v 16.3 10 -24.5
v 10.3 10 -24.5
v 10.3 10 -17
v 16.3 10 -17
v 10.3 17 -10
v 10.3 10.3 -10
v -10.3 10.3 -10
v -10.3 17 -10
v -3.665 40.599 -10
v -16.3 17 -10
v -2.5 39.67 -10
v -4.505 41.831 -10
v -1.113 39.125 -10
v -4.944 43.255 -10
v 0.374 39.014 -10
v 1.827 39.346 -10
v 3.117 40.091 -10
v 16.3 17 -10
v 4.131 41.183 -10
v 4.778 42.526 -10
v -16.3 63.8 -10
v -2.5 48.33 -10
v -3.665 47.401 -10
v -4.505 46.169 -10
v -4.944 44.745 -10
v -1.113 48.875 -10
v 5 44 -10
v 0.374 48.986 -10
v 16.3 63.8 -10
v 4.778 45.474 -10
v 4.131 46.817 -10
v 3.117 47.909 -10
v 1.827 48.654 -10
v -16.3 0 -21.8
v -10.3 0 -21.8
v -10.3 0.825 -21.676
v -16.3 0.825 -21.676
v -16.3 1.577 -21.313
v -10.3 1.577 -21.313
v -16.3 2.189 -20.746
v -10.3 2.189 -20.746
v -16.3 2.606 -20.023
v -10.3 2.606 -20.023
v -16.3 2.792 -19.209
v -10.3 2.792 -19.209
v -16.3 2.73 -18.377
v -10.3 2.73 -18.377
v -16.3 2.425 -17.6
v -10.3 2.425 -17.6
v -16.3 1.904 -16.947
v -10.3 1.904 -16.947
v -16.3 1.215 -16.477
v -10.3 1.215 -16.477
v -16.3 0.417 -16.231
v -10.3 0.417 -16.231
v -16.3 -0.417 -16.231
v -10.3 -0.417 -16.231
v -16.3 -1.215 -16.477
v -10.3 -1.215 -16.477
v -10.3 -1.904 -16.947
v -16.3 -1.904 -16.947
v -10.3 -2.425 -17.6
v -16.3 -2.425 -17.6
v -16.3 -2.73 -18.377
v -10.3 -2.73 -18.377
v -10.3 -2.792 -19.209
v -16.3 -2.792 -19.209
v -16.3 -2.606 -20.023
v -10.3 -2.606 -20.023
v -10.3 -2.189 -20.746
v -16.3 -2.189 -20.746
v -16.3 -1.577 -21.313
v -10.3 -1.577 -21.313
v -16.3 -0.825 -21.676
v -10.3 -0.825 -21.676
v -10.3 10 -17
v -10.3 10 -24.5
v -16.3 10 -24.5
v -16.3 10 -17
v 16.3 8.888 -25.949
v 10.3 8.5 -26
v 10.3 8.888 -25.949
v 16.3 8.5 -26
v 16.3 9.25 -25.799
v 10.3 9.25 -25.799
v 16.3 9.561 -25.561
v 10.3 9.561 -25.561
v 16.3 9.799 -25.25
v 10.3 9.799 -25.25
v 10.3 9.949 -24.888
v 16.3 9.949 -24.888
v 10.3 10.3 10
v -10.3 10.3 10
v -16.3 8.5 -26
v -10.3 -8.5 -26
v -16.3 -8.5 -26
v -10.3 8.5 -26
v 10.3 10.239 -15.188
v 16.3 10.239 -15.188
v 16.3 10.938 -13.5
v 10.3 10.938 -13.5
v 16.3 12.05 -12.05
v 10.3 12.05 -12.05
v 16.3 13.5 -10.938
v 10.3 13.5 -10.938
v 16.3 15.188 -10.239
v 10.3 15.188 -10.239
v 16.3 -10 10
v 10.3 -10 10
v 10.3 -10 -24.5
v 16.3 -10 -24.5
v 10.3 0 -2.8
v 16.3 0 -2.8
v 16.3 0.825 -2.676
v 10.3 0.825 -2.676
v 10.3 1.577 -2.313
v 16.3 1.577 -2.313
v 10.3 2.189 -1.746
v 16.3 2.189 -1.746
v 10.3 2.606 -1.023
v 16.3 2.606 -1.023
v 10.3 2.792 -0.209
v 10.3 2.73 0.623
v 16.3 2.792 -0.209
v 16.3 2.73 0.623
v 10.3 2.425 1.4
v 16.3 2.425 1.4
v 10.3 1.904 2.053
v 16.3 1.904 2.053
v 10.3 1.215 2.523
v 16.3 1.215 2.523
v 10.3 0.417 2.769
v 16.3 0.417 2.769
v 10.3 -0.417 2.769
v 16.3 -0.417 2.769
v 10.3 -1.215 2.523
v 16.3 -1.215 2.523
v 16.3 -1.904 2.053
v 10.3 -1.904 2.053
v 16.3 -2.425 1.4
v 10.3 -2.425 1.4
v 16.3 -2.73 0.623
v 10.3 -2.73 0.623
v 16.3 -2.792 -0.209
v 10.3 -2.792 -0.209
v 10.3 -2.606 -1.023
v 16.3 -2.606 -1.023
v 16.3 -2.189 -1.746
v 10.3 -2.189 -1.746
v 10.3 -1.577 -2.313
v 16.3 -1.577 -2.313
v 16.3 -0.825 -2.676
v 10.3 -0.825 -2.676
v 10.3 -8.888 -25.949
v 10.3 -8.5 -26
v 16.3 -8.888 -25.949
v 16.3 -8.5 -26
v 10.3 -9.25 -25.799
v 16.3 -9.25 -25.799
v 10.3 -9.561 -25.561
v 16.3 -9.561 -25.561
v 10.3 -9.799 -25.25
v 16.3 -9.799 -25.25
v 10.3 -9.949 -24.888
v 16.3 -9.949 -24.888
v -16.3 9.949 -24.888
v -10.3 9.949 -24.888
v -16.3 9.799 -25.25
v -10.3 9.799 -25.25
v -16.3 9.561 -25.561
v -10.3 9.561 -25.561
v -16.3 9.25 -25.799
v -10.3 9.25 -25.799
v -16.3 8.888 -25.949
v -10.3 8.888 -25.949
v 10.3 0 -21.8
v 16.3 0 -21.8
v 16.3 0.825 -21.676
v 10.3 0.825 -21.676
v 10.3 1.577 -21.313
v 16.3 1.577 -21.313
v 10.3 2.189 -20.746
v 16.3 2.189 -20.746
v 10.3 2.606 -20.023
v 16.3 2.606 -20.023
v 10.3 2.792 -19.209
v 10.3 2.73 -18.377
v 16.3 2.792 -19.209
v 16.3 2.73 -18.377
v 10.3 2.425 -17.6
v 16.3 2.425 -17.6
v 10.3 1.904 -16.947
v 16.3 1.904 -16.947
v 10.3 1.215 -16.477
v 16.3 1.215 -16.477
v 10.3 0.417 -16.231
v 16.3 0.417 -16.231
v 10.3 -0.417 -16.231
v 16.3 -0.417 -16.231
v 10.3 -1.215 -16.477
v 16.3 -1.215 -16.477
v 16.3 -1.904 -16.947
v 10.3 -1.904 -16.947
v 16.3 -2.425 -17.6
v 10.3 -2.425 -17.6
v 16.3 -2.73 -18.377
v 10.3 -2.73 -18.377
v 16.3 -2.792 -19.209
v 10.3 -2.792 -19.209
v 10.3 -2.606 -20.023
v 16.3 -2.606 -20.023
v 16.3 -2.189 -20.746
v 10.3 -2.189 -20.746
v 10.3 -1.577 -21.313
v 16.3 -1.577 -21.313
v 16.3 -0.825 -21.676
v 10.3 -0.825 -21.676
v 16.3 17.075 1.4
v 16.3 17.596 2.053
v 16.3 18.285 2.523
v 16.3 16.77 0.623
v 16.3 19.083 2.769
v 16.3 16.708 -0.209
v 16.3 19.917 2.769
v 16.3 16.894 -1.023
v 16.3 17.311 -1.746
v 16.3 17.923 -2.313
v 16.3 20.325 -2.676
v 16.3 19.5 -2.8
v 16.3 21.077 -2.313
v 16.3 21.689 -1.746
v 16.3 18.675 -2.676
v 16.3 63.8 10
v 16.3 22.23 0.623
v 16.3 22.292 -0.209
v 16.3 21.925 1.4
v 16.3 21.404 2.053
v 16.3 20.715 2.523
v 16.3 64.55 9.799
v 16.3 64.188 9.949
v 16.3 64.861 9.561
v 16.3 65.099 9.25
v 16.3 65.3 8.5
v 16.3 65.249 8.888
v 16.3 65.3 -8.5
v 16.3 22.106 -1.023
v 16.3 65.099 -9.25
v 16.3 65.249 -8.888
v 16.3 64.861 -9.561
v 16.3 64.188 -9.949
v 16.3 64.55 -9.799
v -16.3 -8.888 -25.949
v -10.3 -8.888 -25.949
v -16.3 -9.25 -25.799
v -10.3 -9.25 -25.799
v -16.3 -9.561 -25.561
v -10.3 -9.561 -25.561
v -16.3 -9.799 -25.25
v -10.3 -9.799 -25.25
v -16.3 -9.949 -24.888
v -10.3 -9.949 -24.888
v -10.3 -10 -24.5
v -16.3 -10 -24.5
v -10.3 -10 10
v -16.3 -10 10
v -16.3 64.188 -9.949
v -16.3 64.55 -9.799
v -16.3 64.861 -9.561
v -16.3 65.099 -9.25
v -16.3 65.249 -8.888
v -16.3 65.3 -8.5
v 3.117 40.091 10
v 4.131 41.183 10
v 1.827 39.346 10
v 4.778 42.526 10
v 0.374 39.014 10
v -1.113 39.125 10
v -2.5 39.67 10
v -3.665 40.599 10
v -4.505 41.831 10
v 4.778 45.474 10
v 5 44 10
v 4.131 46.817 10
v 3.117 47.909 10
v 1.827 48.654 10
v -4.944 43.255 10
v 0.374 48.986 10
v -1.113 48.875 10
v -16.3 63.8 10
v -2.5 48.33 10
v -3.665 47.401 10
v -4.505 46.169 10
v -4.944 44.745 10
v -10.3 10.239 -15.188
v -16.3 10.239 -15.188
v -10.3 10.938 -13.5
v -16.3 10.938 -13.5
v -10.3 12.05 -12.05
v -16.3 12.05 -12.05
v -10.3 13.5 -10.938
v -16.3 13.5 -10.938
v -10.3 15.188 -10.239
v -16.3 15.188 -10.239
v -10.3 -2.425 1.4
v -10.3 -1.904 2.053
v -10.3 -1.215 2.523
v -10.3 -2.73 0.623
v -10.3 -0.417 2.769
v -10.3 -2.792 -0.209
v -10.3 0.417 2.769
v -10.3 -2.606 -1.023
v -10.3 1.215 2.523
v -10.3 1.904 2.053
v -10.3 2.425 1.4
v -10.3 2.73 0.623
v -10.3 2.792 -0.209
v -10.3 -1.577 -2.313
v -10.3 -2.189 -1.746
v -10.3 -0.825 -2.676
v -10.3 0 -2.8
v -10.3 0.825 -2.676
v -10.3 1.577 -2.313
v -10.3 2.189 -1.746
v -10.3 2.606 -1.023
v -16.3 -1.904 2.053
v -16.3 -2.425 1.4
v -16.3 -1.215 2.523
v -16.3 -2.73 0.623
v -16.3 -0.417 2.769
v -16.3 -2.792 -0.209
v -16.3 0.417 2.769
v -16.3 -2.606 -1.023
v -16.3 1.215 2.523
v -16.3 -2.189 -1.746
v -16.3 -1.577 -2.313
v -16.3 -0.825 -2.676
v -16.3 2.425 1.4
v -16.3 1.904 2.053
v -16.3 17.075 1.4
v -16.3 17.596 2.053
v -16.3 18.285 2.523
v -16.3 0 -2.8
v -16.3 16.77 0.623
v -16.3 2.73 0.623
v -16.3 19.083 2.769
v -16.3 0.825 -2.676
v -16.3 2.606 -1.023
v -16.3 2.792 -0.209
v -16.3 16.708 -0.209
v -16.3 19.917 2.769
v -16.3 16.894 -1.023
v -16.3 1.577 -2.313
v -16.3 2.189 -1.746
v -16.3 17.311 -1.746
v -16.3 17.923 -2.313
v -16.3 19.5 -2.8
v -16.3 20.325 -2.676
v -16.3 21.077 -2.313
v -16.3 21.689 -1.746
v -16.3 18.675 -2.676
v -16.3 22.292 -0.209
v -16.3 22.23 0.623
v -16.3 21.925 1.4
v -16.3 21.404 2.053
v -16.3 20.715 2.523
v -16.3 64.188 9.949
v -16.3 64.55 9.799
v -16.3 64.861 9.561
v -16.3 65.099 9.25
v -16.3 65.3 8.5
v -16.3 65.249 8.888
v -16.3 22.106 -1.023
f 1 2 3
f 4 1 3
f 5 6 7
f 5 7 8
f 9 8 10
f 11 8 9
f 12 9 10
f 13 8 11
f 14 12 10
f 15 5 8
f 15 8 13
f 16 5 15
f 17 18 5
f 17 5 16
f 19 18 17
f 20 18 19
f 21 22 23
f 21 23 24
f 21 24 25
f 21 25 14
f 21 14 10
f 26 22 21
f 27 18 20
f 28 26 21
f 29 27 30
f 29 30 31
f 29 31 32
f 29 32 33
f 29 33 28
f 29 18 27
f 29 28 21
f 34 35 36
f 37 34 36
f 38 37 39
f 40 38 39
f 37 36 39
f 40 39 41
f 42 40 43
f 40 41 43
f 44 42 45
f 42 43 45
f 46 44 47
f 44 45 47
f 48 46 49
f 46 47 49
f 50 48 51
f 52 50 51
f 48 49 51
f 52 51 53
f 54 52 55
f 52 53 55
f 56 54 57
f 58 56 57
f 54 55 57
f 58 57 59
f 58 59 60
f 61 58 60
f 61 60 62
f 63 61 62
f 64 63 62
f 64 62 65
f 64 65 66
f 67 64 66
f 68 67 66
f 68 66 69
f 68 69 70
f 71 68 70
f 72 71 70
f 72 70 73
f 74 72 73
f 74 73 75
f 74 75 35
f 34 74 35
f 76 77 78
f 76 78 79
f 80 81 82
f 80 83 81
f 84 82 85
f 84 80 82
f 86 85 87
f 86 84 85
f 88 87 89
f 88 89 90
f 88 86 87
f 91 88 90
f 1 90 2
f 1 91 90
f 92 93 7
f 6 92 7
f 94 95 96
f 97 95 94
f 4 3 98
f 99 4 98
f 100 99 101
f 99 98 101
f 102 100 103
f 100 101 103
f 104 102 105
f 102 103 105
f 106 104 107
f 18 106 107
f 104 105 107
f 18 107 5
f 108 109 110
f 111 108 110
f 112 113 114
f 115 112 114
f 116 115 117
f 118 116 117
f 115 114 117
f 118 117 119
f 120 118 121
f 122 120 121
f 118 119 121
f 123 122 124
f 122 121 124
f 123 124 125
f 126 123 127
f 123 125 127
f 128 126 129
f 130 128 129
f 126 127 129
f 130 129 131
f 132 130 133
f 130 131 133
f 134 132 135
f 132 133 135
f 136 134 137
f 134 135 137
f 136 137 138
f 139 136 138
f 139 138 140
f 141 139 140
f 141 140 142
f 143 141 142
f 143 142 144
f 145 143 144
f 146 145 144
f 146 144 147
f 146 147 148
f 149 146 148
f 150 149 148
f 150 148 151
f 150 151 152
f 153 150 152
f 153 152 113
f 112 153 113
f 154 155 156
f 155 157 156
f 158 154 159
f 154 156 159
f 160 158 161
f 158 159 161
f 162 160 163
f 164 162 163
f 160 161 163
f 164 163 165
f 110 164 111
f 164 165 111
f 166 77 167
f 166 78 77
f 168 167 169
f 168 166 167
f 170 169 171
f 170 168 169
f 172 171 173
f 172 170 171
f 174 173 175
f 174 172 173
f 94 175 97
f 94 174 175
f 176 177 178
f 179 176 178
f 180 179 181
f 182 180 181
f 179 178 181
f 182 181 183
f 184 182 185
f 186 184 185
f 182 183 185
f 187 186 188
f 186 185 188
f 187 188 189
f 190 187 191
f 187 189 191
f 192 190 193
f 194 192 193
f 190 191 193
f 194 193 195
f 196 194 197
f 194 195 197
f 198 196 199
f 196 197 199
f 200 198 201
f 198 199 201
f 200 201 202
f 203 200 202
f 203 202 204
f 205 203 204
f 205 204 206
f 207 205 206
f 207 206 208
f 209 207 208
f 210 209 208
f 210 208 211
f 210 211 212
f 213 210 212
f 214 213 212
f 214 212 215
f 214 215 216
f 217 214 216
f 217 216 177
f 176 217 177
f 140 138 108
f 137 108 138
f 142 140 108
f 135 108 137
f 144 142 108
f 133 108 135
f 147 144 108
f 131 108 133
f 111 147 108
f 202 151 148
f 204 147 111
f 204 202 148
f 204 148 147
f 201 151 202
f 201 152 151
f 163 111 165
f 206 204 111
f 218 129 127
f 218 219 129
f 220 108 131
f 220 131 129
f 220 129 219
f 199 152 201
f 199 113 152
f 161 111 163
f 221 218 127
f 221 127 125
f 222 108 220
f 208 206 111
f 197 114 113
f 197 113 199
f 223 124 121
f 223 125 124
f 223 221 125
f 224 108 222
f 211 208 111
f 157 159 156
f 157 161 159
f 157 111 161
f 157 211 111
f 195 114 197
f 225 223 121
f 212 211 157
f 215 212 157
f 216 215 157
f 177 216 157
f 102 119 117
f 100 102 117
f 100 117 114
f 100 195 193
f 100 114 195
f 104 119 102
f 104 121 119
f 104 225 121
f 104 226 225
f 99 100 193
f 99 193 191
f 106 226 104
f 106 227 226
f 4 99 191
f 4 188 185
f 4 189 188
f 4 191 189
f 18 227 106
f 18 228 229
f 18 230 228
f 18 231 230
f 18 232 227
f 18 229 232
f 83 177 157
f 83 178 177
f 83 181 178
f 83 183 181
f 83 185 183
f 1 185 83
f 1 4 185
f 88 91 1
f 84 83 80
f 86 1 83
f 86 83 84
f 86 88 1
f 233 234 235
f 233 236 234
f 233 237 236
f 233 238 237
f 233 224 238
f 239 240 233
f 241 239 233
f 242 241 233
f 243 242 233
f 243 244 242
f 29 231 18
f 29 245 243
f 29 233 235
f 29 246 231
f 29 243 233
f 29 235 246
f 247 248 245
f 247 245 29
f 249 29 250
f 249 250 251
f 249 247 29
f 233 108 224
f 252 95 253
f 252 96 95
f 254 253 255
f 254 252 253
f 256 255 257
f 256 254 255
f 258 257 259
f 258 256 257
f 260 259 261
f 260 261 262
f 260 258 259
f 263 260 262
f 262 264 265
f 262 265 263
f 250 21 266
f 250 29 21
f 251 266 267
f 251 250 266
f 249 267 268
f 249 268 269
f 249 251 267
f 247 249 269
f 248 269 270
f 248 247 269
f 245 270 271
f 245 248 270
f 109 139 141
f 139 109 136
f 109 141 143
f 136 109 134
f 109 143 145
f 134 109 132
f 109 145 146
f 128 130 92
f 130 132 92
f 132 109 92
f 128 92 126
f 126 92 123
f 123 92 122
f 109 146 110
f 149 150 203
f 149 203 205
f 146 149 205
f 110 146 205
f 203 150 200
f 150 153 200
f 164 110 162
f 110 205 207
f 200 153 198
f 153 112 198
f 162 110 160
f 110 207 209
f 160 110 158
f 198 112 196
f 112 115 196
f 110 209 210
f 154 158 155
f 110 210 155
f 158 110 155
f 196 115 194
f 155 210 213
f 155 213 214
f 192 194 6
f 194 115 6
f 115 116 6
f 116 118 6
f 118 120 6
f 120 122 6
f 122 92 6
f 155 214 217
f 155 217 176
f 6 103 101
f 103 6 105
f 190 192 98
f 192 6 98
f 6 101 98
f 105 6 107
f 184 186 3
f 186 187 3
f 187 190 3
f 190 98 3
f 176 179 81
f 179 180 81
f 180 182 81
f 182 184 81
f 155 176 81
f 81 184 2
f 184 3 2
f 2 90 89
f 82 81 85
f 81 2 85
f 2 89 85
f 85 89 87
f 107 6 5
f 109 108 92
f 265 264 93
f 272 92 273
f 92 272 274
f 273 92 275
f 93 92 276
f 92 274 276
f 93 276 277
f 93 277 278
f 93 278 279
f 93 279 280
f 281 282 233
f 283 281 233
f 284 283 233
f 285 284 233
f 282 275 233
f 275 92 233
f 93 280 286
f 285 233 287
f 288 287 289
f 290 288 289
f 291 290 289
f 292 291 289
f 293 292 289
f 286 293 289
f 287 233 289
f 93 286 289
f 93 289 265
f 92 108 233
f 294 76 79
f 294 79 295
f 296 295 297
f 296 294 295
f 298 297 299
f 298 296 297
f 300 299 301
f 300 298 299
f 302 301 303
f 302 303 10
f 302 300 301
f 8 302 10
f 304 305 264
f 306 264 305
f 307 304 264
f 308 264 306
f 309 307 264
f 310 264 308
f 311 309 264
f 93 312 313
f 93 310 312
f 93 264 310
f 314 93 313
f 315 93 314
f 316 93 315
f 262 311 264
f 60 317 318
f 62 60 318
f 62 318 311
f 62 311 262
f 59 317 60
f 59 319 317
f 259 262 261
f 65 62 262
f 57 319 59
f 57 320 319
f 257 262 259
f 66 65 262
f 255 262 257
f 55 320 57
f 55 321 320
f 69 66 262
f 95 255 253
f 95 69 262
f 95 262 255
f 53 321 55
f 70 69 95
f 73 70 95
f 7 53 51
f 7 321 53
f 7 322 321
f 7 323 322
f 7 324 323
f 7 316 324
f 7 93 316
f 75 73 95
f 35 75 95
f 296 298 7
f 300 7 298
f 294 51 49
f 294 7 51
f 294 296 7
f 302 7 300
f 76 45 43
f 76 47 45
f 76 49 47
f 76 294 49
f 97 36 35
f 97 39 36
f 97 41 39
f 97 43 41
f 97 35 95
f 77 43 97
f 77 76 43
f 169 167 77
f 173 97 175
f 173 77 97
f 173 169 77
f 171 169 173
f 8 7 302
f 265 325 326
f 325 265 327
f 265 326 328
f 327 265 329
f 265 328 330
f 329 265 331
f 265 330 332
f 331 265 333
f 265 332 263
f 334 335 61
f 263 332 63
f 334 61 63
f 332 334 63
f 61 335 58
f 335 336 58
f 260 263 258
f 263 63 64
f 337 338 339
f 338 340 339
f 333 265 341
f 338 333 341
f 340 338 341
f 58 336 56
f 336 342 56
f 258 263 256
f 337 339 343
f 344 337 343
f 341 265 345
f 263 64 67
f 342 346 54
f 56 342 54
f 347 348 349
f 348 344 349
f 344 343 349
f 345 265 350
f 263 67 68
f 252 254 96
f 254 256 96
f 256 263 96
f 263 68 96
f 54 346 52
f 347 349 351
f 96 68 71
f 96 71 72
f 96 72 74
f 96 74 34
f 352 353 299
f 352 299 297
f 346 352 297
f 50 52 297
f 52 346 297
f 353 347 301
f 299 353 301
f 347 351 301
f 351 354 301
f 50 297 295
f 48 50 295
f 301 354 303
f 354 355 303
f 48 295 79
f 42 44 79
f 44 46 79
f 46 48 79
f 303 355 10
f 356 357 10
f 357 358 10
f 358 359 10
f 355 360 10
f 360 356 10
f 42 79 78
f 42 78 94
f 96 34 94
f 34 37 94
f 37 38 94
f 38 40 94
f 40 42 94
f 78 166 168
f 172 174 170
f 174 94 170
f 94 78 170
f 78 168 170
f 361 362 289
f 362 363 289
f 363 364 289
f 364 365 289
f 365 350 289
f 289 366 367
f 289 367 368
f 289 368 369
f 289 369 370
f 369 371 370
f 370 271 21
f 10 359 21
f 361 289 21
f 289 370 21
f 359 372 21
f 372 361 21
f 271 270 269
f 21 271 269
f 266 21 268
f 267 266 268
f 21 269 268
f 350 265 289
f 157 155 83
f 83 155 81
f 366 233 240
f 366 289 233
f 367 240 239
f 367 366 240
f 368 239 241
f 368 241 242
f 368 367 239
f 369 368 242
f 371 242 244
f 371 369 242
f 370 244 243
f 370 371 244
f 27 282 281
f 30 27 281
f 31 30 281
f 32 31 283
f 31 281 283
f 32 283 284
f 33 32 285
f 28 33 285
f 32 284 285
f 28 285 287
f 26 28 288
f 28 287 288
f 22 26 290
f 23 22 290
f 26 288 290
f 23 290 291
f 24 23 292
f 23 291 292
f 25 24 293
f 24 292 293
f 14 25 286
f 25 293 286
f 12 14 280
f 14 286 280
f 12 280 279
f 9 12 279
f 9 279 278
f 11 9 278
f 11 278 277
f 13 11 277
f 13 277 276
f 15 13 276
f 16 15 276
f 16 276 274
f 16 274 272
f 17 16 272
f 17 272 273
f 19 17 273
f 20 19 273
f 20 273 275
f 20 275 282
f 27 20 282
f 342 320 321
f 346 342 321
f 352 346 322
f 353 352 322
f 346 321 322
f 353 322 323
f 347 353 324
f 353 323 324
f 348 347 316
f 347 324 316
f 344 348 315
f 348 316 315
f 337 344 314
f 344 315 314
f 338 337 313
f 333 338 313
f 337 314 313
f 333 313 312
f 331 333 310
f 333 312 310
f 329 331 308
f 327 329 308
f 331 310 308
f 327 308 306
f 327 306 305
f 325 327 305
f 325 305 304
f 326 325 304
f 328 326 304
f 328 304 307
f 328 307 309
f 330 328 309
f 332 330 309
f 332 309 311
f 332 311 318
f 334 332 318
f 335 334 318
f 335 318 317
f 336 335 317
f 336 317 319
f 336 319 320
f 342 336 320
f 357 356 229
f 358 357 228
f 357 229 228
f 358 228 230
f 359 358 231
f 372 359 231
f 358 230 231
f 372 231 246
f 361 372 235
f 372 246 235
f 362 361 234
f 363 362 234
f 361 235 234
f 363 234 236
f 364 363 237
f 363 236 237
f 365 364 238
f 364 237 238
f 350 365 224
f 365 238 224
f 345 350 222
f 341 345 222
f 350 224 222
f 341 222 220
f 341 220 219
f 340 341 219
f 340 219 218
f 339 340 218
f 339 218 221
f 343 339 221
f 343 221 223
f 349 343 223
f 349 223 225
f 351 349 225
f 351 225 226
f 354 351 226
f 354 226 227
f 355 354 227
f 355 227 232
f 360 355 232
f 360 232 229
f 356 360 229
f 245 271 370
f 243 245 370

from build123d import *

# Parameters (mm, degrees)
EXTRUDE1_DEPTH      = 10.3
EXTRUDE1_DEPTH_BACK = 10.3
SKETCH1_W           = 20
SKETCH1_H           = 55
EXTRUDE2_DEPTH      = 6
SKETCH4_R           = 2.8
EXTRUDE3_DEPTH      = 78.478061411
SKETCH5_R           = 5
EXTRUDE4_DEPTH      = 77.326797391
FILLET2_R           = 1.5
SKETCH_1_W          = 32.6
SKETCH_1_H          = 73.8
CUT_EXTRUDE_1_DEPTH = 77.326797391


with BuildPart() as part:
    # Sketch1 → Extrude1 (new, two sides: drawn at the far end of the back side and taken through both)
    with BuildSketch(Plane(origin=(0, 0, 0), x_dir=(0, 0, -1), z_dir=(1, 0, 0)).offset(-EXTRUDE1_DEPTH_BACK)):
        with Locations((0, 37.8)):
            Rectangle(SKETCH1_W, SKETCH1_H)
    extrude(amount=EXTRUDE1_DEPTH + EXTRUDE1_DEPTH_BACK)

    # Sketch2 → Extrude2 (add)
    with BuildSketch(Plane(origin=(10.3, 0, 0), x_dir=(0, 0, -1), z_dir=(1, 0, 0))):
        with BuildLine():
            Line((26, 10), (17, 10))
            ThreePointArc((17, 10), (12.050252532, 12.050252532), (10, 17))
            Line((10, 17), (10, 65.3))
            Line((10, 65.3), (-10, 65.3))
            Line((-10, 65.3), (-10, 17))
            ThreePointArc((-10, 17), (-12.050252532, 12.050252532), (-17, 10))
            Line((-17, 10), (-26, 10))
            Line((-26, 10), (-26, -10))
            Line((-26, -10), (26, -10))
            Line((26, -10), (26, 10))
        make_face()
    extrude2 = extrude(amount=EXTRUDE2_DEPTH)

    # Mirror2: Extrude2 across plane
    add(extrude2.mirror(Plane(origin=(0, 0, 0), x_dir=(0, 0, 1), z_dir=(1, 0, 0))))

    # Sketch4 → Extrude3 (cut, through all)
    with BuildSketch(Plane(origin=(16.3, 0, 0), x_dir=(0, 0, -1), z_dir=(1, 0, 0))):
        Circle(SKETCH4_R)
        with Locations((19, 0)):
            Circle(SKETCH4_R)
        with Locations((-19, 0)):
            Circle(SKETCH4_R)
        with Locations((0, 19.5)):
            Circle(SKETCH4_R)
    extrude(amount=-EXTRUDE3_DEPTH, mode=Mode.SUBTRACT)

    # Sketch5 → Extrude4 (cut, through all)
    with BuildSketch(Plane.XY.offset(10)):
        with Locations((0, 44)):
            Circle(SKETCH5_R)
    extrude(amount=-EXTRUDE4_DEPTH, mode=Mode.SUBTRACT)

    # Fillet2
    fillet2_edges = [part.edges().sort_by_distance(p)[0] for p in [
        (13.3, 10, 26),
        (13.3, -10, 26),
        (13.3, -10, -26),
        (13.3, 10, -26),
        (-13.3, -10, 26),
        (-13.3, 10, 26),
        (-13.3, 10, -26),
        (-13.3, -10, -26),
        (0, 65.3, 10),
        (0, 65.3, -10),
    ]]
    fillet(fillet2_edges, radius=FILLET2_R)

    # Эскиз1 → Вырез-Вытянуть1 (cut, through all)
    with BuildSketch(Plane(origin=(0, 0, 10), x_dir=(-1, 0, 0), z_dir=(0, 0, -1))):
        with Locations((0, 26.9)):
            Rectangle(SKETCH_1_W, SKETCH_1_H)
    extrude(amount=-CUT_EXTRUDE_1_DEPTH, mode=Mode.SUBTRACT)


solid = part.part
